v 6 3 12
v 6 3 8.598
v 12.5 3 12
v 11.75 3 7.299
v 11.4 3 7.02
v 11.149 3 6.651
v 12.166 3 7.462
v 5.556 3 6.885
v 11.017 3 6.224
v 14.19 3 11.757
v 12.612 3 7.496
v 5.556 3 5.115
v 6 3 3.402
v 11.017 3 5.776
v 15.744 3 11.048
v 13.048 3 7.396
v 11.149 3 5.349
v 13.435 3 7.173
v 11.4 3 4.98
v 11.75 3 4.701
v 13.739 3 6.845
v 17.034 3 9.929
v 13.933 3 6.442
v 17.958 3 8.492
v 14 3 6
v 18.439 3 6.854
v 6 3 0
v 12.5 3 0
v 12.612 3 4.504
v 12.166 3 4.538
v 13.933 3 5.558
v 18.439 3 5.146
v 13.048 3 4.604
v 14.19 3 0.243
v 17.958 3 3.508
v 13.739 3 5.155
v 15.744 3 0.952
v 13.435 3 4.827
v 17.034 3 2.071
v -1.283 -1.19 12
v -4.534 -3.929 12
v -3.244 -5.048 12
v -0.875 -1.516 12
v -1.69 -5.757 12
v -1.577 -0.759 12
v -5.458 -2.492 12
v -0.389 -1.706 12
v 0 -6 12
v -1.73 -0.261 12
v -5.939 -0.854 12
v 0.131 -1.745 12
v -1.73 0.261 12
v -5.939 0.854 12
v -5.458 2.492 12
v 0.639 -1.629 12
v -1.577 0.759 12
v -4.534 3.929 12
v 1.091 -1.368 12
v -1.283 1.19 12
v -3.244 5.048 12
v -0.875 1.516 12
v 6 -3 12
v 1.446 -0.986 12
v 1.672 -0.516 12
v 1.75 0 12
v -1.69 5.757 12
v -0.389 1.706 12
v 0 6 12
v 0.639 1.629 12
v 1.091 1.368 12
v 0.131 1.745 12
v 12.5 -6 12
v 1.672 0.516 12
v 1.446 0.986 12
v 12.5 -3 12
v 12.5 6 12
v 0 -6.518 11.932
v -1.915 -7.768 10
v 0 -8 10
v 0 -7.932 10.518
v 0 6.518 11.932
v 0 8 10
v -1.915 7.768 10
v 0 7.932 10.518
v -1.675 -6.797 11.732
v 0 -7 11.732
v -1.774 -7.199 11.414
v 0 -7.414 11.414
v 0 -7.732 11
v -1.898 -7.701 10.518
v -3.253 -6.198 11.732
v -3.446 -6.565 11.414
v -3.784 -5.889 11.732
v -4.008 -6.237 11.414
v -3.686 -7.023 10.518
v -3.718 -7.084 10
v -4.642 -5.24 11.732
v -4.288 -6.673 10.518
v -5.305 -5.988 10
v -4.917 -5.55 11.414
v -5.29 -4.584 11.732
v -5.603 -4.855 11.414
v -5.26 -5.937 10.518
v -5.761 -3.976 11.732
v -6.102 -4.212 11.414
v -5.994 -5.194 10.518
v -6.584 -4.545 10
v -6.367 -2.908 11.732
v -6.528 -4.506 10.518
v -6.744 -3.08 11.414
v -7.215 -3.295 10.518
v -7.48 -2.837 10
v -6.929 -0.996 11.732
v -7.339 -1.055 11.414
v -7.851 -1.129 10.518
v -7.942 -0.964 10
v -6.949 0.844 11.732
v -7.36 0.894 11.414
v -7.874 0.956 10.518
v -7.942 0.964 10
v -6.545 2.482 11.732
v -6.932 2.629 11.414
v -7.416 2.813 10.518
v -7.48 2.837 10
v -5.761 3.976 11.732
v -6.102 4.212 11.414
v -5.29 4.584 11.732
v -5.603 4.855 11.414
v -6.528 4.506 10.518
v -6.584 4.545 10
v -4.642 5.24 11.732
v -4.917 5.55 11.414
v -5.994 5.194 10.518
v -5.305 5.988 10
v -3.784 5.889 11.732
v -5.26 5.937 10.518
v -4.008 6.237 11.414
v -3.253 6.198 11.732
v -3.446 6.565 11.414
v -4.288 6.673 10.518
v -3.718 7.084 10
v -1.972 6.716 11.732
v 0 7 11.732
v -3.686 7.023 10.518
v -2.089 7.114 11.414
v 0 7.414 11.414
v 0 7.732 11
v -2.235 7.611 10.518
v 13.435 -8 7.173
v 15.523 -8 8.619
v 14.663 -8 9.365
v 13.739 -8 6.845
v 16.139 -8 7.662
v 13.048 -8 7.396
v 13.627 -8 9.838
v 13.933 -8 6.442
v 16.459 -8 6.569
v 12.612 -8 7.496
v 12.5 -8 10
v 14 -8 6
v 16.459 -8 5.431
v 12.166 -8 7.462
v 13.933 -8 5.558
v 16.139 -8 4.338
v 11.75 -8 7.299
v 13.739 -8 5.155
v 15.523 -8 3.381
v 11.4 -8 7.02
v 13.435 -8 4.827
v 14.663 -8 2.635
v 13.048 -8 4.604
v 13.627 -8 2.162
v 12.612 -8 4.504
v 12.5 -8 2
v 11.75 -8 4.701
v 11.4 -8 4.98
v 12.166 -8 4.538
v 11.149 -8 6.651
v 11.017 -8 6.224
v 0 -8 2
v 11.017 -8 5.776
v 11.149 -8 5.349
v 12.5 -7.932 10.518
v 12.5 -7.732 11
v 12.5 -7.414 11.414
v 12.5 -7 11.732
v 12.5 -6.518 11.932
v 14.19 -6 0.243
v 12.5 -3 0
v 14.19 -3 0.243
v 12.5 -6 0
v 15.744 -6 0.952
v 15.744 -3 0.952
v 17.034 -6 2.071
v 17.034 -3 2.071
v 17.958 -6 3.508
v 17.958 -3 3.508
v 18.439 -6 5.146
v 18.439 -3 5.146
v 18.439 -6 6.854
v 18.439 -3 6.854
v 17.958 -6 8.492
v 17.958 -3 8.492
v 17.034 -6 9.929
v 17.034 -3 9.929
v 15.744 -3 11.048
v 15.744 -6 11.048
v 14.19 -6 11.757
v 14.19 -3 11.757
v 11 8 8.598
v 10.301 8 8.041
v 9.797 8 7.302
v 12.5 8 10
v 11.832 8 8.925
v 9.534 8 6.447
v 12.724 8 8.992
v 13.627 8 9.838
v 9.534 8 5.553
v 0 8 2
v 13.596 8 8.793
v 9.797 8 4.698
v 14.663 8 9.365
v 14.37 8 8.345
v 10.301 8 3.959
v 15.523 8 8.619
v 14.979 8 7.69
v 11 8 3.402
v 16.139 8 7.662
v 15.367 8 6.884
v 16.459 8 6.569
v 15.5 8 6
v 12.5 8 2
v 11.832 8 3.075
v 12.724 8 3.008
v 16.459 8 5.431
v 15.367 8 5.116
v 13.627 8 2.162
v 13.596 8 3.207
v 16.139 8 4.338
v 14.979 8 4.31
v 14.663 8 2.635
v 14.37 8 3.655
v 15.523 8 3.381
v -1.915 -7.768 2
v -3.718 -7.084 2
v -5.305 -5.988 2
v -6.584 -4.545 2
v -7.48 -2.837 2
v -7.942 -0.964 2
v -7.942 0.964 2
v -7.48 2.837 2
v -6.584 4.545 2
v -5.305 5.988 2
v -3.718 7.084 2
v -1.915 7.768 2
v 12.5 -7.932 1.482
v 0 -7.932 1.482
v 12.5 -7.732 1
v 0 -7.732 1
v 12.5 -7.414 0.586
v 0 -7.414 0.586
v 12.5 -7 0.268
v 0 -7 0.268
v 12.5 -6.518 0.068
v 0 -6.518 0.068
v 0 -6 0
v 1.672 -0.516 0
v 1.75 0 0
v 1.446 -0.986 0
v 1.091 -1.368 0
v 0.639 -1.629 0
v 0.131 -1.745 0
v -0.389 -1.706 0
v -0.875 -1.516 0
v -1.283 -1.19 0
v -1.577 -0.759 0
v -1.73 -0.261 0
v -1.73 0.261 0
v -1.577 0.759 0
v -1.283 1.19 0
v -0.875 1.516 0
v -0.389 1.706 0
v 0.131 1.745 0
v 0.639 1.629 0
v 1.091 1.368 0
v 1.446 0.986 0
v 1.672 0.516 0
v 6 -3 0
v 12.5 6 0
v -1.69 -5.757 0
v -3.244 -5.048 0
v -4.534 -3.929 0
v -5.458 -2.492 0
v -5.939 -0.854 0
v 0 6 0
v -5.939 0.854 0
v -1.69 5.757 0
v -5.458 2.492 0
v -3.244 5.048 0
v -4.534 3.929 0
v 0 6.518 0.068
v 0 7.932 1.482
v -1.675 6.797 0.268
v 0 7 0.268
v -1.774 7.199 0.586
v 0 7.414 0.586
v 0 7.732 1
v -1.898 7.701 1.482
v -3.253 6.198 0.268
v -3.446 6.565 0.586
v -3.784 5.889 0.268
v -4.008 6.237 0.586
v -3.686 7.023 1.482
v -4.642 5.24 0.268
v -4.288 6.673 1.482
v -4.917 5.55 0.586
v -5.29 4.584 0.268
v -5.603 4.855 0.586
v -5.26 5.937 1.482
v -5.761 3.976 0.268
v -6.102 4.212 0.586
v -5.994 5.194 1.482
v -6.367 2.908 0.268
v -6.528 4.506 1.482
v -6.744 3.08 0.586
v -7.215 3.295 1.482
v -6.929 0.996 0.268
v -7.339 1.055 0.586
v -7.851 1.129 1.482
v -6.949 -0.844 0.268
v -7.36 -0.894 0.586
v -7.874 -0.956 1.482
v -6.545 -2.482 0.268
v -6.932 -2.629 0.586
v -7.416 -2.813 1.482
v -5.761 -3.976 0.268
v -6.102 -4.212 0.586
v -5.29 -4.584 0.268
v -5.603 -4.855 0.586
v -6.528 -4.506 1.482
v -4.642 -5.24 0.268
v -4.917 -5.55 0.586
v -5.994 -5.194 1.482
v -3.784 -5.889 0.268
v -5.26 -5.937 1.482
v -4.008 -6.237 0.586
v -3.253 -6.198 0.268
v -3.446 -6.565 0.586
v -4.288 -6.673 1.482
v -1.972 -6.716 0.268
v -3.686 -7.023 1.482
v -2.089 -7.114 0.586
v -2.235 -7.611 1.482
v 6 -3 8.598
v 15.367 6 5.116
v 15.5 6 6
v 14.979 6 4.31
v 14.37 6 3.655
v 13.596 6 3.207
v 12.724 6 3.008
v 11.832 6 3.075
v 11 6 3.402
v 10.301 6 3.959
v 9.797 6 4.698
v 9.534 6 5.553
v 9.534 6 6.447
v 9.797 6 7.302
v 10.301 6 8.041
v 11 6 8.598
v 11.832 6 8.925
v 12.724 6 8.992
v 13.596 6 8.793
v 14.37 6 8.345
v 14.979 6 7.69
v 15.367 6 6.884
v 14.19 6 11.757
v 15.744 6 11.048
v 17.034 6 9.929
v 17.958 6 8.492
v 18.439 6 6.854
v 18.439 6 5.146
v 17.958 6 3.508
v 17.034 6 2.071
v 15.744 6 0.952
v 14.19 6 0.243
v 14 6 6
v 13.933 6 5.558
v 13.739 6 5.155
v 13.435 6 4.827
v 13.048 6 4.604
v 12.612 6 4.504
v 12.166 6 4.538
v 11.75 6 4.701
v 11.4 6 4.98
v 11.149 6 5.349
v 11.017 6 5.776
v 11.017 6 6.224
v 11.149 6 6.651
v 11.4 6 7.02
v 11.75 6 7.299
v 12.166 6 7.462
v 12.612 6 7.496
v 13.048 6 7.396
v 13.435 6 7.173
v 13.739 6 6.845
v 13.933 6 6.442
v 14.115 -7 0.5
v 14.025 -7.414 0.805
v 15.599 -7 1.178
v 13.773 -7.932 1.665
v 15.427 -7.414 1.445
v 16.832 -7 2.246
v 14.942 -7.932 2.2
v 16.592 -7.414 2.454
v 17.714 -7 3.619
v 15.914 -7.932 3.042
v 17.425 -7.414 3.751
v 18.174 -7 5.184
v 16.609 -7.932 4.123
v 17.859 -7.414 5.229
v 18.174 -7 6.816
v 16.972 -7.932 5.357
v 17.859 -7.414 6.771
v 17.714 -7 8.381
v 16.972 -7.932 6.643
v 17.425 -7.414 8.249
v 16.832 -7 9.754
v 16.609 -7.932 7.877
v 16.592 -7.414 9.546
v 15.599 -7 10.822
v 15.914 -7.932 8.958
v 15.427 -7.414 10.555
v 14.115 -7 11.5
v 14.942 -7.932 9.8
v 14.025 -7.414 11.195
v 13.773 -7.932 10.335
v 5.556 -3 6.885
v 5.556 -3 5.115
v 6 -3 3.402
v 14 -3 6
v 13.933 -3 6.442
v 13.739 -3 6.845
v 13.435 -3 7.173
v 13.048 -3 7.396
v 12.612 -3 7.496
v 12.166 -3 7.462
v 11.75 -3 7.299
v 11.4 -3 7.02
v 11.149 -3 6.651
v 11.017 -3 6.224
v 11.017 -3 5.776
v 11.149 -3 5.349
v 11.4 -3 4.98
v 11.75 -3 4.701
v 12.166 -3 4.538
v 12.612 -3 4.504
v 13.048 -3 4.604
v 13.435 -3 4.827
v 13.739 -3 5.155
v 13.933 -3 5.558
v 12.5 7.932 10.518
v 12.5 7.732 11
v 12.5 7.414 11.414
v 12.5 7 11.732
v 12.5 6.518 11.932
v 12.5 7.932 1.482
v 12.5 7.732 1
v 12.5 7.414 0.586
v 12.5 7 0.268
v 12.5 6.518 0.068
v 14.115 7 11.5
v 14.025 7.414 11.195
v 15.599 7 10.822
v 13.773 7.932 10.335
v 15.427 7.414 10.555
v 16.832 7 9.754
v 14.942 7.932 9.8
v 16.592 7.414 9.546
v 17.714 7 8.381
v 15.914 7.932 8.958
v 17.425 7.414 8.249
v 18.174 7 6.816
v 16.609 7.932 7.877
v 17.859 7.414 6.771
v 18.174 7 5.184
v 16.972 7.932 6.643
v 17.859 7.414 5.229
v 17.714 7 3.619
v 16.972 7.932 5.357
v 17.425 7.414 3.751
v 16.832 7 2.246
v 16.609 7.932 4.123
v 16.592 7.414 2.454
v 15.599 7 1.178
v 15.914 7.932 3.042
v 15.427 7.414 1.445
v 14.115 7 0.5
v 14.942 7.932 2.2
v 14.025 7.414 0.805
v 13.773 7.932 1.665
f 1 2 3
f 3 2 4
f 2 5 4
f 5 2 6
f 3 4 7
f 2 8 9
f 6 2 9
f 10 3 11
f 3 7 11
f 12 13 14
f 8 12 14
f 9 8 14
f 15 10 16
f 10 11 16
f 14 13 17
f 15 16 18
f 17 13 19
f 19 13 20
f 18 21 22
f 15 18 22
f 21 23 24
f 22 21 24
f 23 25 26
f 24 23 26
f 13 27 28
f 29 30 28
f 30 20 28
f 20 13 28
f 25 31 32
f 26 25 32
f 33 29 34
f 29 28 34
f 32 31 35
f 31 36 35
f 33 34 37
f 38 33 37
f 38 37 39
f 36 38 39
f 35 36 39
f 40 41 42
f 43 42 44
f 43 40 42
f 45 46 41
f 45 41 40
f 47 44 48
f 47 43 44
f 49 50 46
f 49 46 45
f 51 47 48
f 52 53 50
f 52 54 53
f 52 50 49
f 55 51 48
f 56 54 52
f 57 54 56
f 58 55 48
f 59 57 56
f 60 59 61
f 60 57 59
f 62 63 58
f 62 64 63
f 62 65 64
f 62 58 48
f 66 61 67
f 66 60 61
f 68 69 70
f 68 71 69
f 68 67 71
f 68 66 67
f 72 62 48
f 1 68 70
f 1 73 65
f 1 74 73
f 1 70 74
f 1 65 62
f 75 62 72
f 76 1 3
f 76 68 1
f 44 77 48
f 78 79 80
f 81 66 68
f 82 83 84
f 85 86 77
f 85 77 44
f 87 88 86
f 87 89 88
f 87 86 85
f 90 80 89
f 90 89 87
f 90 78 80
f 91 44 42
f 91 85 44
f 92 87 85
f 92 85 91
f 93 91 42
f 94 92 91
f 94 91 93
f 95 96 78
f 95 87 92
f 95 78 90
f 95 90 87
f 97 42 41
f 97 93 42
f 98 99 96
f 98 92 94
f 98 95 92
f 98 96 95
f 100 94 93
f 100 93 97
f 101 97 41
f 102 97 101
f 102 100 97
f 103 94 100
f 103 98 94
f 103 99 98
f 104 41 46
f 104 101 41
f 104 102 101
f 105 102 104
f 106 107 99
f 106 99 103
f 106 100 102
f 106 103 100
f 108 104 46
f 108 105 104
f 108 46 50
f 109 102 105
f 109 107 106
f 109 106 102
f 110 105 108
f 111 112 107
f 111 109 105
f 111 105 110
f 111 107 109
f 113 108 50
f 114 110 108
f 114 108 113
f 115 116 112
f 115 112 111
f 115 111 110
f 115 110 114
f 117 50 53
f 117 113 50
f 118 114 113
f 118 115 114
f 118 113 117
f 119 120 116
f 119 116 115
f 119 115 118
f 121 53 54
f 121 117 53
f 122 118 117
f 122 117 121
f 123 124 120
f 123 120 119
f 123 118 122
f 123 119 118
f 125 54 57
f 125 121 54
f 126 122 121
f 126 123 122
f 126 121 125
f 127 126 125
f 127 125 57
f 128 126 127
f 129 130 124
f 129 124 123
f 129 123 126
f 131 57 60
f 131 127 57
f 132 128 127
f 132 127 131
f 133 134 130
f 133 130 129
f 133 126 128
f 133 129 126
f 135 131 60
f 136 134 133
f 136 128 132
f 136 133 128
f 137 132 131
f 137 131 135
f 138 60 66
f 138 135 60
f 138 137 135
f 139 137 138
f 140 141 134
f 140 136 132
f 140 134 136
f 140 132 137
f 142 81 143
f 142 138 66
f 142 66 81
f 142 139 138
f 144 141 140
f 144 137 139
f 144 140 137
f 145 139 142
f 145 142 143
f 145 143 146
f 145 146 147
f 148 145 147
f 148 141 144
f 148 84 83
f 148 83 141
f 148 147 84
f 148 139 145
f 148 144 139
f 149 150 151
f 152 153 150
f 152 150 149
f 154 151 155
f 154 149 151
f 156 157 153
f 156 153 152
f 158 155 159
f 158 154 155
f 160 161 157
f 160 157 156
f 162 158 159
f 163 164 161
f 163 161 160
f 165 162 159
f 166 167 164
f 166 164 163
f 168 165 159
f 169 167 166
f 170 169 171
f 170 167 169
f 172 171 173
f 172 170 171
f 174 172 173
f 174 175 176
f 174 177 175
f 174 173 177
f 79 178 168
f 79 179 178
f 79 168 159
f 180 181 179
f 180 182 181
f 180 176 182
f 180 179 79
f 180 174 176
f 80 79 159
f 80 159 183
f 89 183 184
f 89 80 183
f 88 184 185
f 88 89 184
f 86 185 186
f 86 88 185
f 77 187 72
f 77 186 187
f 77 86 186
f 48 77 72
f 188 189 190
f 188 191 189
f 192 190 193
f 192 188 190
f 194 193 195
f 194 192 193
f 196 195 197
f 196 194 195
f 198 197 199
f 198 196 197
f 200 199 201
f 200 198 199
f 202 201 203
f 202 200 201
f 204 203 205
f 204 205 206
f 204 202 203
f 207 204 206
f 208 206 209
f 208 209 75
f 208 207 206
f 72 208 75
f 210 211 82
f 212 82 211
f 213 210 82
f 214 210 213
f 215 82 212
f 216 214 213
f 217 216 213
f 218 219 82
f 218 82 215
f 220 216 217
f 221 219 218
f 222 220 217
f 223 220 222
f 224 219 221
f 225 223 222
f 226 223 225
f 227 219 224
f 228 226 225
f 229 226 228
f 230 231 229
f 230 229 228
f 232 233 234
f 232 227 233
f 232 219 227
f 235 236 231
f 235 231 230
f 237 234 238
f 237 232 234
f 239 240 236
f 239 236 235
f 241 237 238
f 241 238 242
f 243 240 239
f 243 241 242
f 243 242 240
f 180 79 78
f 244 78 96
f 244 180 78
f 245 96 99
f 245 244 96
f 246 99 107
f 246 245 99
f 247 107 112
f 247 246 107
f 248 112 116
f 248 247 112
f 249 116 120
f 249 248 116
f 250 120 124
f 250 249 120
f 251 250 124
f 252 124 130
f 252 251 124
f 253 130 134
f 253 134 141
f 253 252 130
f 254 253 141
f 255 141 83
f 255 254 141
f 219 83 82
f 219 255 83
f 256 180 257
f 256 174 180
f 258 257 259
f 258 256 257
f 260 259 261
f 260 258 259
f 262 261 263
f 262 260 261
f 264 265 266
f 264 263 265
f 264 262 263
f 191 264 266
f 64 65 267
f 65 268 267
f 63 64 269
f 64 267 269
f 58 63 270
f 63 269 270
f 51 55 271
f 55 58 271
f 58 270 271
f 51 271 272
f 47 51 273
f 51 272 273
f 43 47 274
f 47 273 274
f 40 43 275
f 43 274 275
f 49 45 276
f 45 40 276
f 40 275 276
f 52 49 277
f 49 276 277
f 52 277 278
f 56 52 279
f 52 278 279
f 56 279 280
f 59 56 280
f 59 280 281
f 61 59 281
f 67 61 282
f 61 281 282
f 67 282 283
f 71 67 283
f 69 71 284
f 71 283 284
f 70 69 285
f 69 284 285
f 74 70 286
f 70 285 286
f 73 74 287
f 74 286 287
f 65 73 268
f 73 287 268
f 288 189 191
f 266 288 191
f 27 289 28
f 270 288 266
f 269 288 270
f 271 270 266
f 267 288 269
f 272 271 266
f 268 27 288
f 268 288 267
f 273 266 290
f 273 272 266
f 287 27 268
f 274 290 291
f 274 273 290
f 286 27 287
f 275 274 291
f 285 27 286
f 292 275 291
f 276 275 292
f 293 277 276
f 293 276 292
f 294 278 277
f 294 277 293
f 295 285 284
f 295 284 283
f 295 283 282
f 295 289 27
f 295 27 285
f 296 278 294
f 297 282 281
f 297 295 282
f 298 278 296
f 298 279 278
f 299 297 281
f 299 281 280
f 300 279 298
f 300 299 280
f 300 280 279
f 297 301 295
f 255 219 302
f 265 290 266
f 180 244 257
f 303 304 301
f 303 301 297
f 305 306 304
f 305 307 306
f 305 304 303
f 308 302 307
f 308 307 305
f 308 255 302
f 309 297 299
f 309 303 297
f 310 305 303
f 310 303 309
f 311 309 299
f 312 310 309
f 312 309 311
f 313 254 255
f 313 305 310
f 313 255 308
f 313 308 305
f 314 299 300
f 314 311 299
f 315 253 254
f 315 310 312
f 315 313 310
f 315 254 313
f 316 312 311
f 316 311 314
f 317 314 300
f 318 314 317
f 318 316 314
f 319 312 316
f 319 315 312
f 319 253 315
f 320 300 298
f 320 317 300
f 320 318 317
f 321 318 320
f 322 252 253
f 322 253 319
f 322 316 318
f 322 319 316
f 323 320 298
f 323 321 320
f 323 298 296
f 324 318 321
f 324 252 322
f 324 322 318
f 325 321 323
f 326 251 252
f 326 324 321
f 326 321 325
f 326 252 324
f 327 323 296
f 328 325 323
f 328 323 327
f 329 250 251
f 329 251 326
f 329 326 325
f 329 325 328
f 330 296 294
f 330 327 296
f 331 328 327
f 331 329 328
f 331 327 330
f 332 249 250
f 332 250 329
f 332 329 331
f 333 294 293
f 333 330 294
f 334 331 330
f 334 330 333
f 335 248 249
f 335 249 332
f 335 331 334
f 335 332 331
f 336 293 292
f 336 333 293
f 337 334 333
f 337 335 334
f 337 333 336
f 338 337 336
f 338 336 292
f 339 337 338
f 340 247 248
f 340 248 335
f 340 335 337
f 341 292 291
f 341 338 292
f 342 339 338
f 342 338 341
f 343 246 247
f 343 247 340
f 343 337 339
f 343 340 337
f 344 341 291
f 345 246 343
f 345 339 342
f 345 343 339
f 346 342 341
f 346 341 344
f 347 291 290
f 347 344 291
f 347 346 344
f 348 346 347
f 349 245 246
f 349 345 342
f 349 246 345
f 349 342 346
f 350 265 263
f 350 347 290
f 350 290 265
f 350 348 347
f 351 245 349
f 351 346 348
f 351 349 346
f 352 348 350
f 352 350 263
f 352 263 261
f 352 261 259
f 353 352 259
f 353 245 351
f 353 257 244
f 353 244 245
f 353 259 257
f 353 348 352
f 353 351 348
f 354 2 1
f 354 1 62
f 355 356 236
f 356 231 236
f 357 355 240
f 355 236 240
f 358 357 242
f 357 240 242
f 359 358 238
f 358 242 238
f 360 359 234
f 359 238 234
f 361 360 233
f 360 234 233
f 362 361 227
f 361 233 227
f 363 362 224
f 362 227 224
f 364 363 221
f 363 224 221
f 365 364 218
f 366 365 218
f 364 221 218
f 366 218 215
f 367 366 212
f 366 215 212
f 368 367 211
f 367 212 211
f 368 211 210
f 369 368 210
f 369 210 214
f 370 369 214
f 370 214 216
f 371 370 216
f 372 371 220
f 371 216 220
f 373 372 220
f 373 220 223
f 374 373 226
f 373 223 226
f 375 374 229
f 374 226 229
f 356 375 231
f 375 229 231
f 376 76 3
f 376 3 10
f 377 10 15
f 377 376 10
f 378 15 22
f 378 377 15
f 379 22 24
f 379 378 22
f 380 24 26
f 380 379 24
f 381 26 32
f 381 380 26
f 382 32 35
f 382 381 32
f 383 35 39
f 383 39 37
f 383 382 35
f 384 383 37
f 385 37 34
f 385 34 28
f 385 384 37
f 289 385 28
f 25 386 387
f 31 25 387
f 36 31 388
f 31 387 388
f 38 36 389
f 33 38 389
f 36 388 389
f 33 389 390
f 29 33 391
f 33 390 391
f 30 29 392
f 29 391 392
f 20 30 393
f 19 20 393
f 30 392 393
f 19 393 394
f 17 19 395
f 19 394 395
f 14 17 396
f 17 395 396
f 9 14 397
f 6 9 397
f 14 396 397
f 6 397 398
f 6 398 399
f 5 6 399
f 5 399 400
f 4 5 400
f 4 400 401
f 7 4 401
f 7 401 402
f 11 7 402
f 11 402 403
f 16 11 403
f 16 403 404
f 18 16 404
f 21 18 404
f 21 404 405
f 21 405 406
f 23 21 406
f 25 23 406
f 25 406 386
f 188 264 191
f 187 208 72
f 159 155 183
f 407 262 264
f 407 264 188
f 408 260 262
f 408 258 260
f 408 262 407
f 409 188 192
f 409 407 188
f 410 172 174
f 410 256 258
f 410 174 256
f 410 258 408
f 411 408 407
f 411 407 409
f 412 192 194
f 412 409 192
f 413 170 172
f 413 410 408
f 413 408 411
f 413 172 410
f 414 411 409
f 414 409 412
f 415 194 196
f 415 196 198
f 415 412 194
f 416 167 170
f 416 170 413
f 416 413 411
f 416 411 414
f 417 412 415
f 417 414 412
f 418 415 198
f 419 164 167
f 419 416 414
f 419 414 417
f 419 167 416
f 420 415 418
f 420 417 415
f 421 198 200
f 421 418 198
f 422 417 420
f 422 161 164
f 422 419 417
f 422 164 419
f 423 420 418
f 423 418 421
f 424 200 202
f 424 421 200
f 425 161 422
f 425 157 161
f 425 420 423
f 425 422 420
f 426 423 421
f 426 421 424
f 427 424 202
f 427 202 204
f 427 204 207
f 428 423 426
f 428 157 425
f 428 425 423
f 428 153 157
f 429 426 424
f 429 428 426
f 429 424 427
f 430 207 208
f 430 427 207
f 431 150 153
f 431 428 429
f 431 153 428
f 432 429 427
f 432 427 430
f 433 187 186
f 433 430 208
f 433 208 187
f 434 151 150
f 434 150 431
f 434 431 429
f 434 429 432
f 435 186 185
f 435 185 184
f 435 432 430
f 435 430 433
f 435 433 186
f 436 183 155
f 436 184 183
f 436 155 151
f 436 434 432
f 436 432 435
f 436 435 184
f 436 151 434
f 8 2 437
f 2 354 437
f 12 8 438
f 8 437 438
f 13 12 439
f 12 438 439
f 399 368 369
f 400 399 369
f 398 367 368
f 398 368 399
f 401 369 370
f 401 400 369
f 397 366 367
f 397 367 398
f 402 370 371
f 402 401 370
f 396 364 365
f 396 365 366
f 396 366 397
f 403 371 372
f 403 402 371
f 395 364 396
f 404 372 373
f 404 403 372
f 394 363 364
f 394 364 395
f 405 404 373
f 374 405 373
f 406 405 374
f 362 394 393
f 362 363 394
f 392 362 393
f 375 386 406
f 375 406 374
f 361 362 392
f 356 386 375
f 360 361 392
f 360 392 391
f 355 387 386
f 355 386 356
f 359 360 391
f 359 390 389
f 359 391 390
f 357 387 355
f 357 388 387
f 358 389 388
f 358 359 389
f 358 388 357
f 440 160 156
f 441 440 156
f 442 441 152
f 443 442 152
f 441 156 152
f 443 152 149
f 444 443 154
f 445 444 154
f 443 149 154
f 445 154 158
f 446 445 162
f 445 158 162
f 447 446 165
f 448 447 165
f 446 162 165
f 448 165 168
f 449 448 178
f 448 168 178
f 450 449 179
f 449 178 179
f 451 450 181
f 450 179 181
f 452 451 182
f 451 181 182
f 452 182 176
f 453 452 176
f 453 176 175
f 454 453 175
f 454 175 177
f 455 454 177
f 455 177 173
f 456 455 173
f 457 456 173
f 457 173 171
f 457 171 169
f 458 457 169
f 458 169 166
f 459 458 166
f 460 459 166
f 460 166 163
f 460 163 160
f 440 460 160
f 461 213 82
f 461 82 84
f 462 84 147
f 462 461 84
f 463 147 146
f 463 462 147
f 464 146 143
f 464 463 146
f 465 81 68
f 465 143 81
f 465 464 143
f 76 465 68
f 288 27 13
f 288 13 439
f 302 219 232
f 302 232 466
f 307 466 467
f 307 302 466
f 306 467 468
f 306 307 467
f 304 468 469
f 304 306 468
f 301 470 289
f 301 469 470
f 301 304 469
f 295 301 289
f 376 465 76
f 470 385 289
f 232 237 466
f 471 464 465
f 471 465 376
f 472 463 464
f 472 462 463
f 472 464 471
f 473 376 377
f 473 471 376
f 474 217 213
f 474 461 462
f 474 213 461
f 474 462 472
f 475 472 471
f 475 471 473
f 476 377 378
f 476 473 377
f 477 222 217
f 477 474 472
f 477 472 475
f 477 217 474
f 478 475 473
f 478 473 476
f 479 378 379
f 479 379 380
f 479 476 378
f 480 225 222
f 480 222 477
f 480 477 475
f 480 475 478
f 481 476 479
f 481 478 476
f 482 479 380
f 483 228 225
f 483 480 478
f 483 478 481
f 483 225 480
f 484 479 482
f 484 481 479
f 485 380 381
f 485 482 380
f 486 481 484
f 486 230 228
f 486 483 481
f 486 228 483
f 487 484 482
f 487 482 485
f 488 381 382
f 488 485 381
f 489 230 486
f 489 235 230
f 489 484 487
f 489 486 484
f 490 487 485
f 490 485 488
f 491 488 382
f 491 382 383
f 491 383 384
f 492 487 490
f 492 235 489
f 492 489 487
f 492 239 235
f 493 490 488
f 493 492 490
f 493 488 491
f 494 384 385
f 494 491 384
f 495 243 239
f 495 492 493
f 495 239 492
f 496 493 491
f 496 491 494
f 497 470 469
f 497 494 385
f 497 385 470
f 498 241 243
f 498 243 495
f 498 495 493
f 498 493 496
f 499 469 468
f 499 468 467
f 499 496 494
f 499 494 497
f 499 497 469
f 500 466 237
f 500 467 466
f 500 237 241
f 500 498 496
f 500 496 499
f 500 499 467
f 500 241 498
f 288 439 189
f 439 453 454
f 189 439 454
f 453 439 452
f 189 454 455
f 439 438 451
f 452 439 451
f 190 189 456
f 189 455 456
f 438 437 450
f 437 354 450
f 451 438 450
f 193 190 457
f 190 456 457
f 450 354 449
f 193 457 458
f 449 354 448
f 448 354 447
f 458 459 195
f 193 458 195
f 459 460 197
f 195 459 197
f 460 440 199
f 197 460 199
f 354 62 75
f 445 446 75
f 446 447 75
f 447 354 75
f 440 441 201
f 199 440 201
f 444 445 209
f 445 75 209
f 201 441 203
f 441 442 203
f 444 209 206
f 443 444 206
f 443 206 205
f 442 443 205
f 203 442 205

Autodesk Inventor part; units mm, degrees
ref_plane "YZ Plane" through (0, 0, 0) normal (1, 0, 0) x (0, 1, 0)
ref_plane "XZ Plane" through (0, 0, 0) normal (0, 1, 0) x (-1, 0, 0)
ref_plane "XY Plane" through (0, 0, 0) normal (0, 0, 1) x (1, 0, 0)
sketch "Sketch2" plane through (0, 0, 0) normal (0, 0, 1) x (1, 0, 0)
  circle A0 centre (0, 0) radius 1.75
  circle A1 centre (0, 0) radius 8 construction
  arc A2 (0, 8) -> (0, -8) centre (0, 0) ccw
  line L0 (0, 8) -> (6, 8)
  line L1 (6, 8) -> (6, -8)
  line L2 (6, -8) -> (0, -8)
  dimension "d0" = 3.5
  dimension "d1" = 16
  dimension "d2" = 6
extrude "Extrusion1" add sketch "Sketch2" along normal blind 12
sketch "Sketch3" plane through (0, -8, 0) normal (0, -1, 0) x (1, 0, 0)
  circle A0 centre (12.5, 6) radius 6 construction
  line L0 (6, 0) -> (6, 12) projected
  line L1 (0, 0) -> (0, 12) projected
  circle A1 centre (12.5, 6) radius 1.5
  arc A2 (12.5, 0) -> (12.5, 12) centre (12.5, 6) ccw
  line L2 (6, 12) -> (12.5, 12)
  line L3 (6, 0) -> (12.5, 0)
  point P0 (6, 6)
  dimension "d5" = 12
  dimension "d6" = 12.5
  dimension "d7" = 3
extrude "Extrusion2" add sketch "Sketch3" against normal blind 5
sketch "Sketch4" plane through (0, 8, 0) normal (0, 1, 0) x (1, 0, 0)
  circle A0 centre (12.5, -6) radius 1.5 projected
  line L0 (6, -12) -> (6, 0) projected
  line L1 (6, -12) -> (12.5, -12) projected
  arc A1 (12.5, -12) -> (12.5, 0) centre (12.5, -6) ccw projected
  line L2 (12.5, 0) -> (6, 0) projected
  point P0 (0, 0)
extrude "Extrusion3" add sketch "Sketch4" against normal blind 5
sketch "Sketch6" plane through (0, 8, 12) normal (0, 1, 0) x (1, 0, 0)
  circle A0 centre (12.5, 6) radius 1.5 projected
  circle A1 centre (12.5, 6) radius 3
  point P0 (0, 12)
  dimension "d13" = 6
extrude "Extrusion4" cut sketch "Sketch6" against normal blind 2
sketch "Sketch7" plane through (0, -3, 0) normal (0, 1, 0) x (1, 0, 0)
  arc A0 (12.5, -12) -> (12.5, 0) centre (12.5, -6) ccw projected
  circle A1 centre (12.5, -6) radius 7
  point P0 (0, 0)
  dimension "d16" = 14
extrude "Extrusion5" cut sketch "Sketch7" along normal blind 6
fillet "Fillet1" radius 2 8 edges at (18.5, 8, 6) (6.25, 8, 0) (-8, 0, 0) (6.25, -8, 0) (18.5, -8, 6) (6.25, -8, 12) (-8, 0, 12) (6.25, 8, 12)
properties part number "Arm1" material "ABS Plastic"
